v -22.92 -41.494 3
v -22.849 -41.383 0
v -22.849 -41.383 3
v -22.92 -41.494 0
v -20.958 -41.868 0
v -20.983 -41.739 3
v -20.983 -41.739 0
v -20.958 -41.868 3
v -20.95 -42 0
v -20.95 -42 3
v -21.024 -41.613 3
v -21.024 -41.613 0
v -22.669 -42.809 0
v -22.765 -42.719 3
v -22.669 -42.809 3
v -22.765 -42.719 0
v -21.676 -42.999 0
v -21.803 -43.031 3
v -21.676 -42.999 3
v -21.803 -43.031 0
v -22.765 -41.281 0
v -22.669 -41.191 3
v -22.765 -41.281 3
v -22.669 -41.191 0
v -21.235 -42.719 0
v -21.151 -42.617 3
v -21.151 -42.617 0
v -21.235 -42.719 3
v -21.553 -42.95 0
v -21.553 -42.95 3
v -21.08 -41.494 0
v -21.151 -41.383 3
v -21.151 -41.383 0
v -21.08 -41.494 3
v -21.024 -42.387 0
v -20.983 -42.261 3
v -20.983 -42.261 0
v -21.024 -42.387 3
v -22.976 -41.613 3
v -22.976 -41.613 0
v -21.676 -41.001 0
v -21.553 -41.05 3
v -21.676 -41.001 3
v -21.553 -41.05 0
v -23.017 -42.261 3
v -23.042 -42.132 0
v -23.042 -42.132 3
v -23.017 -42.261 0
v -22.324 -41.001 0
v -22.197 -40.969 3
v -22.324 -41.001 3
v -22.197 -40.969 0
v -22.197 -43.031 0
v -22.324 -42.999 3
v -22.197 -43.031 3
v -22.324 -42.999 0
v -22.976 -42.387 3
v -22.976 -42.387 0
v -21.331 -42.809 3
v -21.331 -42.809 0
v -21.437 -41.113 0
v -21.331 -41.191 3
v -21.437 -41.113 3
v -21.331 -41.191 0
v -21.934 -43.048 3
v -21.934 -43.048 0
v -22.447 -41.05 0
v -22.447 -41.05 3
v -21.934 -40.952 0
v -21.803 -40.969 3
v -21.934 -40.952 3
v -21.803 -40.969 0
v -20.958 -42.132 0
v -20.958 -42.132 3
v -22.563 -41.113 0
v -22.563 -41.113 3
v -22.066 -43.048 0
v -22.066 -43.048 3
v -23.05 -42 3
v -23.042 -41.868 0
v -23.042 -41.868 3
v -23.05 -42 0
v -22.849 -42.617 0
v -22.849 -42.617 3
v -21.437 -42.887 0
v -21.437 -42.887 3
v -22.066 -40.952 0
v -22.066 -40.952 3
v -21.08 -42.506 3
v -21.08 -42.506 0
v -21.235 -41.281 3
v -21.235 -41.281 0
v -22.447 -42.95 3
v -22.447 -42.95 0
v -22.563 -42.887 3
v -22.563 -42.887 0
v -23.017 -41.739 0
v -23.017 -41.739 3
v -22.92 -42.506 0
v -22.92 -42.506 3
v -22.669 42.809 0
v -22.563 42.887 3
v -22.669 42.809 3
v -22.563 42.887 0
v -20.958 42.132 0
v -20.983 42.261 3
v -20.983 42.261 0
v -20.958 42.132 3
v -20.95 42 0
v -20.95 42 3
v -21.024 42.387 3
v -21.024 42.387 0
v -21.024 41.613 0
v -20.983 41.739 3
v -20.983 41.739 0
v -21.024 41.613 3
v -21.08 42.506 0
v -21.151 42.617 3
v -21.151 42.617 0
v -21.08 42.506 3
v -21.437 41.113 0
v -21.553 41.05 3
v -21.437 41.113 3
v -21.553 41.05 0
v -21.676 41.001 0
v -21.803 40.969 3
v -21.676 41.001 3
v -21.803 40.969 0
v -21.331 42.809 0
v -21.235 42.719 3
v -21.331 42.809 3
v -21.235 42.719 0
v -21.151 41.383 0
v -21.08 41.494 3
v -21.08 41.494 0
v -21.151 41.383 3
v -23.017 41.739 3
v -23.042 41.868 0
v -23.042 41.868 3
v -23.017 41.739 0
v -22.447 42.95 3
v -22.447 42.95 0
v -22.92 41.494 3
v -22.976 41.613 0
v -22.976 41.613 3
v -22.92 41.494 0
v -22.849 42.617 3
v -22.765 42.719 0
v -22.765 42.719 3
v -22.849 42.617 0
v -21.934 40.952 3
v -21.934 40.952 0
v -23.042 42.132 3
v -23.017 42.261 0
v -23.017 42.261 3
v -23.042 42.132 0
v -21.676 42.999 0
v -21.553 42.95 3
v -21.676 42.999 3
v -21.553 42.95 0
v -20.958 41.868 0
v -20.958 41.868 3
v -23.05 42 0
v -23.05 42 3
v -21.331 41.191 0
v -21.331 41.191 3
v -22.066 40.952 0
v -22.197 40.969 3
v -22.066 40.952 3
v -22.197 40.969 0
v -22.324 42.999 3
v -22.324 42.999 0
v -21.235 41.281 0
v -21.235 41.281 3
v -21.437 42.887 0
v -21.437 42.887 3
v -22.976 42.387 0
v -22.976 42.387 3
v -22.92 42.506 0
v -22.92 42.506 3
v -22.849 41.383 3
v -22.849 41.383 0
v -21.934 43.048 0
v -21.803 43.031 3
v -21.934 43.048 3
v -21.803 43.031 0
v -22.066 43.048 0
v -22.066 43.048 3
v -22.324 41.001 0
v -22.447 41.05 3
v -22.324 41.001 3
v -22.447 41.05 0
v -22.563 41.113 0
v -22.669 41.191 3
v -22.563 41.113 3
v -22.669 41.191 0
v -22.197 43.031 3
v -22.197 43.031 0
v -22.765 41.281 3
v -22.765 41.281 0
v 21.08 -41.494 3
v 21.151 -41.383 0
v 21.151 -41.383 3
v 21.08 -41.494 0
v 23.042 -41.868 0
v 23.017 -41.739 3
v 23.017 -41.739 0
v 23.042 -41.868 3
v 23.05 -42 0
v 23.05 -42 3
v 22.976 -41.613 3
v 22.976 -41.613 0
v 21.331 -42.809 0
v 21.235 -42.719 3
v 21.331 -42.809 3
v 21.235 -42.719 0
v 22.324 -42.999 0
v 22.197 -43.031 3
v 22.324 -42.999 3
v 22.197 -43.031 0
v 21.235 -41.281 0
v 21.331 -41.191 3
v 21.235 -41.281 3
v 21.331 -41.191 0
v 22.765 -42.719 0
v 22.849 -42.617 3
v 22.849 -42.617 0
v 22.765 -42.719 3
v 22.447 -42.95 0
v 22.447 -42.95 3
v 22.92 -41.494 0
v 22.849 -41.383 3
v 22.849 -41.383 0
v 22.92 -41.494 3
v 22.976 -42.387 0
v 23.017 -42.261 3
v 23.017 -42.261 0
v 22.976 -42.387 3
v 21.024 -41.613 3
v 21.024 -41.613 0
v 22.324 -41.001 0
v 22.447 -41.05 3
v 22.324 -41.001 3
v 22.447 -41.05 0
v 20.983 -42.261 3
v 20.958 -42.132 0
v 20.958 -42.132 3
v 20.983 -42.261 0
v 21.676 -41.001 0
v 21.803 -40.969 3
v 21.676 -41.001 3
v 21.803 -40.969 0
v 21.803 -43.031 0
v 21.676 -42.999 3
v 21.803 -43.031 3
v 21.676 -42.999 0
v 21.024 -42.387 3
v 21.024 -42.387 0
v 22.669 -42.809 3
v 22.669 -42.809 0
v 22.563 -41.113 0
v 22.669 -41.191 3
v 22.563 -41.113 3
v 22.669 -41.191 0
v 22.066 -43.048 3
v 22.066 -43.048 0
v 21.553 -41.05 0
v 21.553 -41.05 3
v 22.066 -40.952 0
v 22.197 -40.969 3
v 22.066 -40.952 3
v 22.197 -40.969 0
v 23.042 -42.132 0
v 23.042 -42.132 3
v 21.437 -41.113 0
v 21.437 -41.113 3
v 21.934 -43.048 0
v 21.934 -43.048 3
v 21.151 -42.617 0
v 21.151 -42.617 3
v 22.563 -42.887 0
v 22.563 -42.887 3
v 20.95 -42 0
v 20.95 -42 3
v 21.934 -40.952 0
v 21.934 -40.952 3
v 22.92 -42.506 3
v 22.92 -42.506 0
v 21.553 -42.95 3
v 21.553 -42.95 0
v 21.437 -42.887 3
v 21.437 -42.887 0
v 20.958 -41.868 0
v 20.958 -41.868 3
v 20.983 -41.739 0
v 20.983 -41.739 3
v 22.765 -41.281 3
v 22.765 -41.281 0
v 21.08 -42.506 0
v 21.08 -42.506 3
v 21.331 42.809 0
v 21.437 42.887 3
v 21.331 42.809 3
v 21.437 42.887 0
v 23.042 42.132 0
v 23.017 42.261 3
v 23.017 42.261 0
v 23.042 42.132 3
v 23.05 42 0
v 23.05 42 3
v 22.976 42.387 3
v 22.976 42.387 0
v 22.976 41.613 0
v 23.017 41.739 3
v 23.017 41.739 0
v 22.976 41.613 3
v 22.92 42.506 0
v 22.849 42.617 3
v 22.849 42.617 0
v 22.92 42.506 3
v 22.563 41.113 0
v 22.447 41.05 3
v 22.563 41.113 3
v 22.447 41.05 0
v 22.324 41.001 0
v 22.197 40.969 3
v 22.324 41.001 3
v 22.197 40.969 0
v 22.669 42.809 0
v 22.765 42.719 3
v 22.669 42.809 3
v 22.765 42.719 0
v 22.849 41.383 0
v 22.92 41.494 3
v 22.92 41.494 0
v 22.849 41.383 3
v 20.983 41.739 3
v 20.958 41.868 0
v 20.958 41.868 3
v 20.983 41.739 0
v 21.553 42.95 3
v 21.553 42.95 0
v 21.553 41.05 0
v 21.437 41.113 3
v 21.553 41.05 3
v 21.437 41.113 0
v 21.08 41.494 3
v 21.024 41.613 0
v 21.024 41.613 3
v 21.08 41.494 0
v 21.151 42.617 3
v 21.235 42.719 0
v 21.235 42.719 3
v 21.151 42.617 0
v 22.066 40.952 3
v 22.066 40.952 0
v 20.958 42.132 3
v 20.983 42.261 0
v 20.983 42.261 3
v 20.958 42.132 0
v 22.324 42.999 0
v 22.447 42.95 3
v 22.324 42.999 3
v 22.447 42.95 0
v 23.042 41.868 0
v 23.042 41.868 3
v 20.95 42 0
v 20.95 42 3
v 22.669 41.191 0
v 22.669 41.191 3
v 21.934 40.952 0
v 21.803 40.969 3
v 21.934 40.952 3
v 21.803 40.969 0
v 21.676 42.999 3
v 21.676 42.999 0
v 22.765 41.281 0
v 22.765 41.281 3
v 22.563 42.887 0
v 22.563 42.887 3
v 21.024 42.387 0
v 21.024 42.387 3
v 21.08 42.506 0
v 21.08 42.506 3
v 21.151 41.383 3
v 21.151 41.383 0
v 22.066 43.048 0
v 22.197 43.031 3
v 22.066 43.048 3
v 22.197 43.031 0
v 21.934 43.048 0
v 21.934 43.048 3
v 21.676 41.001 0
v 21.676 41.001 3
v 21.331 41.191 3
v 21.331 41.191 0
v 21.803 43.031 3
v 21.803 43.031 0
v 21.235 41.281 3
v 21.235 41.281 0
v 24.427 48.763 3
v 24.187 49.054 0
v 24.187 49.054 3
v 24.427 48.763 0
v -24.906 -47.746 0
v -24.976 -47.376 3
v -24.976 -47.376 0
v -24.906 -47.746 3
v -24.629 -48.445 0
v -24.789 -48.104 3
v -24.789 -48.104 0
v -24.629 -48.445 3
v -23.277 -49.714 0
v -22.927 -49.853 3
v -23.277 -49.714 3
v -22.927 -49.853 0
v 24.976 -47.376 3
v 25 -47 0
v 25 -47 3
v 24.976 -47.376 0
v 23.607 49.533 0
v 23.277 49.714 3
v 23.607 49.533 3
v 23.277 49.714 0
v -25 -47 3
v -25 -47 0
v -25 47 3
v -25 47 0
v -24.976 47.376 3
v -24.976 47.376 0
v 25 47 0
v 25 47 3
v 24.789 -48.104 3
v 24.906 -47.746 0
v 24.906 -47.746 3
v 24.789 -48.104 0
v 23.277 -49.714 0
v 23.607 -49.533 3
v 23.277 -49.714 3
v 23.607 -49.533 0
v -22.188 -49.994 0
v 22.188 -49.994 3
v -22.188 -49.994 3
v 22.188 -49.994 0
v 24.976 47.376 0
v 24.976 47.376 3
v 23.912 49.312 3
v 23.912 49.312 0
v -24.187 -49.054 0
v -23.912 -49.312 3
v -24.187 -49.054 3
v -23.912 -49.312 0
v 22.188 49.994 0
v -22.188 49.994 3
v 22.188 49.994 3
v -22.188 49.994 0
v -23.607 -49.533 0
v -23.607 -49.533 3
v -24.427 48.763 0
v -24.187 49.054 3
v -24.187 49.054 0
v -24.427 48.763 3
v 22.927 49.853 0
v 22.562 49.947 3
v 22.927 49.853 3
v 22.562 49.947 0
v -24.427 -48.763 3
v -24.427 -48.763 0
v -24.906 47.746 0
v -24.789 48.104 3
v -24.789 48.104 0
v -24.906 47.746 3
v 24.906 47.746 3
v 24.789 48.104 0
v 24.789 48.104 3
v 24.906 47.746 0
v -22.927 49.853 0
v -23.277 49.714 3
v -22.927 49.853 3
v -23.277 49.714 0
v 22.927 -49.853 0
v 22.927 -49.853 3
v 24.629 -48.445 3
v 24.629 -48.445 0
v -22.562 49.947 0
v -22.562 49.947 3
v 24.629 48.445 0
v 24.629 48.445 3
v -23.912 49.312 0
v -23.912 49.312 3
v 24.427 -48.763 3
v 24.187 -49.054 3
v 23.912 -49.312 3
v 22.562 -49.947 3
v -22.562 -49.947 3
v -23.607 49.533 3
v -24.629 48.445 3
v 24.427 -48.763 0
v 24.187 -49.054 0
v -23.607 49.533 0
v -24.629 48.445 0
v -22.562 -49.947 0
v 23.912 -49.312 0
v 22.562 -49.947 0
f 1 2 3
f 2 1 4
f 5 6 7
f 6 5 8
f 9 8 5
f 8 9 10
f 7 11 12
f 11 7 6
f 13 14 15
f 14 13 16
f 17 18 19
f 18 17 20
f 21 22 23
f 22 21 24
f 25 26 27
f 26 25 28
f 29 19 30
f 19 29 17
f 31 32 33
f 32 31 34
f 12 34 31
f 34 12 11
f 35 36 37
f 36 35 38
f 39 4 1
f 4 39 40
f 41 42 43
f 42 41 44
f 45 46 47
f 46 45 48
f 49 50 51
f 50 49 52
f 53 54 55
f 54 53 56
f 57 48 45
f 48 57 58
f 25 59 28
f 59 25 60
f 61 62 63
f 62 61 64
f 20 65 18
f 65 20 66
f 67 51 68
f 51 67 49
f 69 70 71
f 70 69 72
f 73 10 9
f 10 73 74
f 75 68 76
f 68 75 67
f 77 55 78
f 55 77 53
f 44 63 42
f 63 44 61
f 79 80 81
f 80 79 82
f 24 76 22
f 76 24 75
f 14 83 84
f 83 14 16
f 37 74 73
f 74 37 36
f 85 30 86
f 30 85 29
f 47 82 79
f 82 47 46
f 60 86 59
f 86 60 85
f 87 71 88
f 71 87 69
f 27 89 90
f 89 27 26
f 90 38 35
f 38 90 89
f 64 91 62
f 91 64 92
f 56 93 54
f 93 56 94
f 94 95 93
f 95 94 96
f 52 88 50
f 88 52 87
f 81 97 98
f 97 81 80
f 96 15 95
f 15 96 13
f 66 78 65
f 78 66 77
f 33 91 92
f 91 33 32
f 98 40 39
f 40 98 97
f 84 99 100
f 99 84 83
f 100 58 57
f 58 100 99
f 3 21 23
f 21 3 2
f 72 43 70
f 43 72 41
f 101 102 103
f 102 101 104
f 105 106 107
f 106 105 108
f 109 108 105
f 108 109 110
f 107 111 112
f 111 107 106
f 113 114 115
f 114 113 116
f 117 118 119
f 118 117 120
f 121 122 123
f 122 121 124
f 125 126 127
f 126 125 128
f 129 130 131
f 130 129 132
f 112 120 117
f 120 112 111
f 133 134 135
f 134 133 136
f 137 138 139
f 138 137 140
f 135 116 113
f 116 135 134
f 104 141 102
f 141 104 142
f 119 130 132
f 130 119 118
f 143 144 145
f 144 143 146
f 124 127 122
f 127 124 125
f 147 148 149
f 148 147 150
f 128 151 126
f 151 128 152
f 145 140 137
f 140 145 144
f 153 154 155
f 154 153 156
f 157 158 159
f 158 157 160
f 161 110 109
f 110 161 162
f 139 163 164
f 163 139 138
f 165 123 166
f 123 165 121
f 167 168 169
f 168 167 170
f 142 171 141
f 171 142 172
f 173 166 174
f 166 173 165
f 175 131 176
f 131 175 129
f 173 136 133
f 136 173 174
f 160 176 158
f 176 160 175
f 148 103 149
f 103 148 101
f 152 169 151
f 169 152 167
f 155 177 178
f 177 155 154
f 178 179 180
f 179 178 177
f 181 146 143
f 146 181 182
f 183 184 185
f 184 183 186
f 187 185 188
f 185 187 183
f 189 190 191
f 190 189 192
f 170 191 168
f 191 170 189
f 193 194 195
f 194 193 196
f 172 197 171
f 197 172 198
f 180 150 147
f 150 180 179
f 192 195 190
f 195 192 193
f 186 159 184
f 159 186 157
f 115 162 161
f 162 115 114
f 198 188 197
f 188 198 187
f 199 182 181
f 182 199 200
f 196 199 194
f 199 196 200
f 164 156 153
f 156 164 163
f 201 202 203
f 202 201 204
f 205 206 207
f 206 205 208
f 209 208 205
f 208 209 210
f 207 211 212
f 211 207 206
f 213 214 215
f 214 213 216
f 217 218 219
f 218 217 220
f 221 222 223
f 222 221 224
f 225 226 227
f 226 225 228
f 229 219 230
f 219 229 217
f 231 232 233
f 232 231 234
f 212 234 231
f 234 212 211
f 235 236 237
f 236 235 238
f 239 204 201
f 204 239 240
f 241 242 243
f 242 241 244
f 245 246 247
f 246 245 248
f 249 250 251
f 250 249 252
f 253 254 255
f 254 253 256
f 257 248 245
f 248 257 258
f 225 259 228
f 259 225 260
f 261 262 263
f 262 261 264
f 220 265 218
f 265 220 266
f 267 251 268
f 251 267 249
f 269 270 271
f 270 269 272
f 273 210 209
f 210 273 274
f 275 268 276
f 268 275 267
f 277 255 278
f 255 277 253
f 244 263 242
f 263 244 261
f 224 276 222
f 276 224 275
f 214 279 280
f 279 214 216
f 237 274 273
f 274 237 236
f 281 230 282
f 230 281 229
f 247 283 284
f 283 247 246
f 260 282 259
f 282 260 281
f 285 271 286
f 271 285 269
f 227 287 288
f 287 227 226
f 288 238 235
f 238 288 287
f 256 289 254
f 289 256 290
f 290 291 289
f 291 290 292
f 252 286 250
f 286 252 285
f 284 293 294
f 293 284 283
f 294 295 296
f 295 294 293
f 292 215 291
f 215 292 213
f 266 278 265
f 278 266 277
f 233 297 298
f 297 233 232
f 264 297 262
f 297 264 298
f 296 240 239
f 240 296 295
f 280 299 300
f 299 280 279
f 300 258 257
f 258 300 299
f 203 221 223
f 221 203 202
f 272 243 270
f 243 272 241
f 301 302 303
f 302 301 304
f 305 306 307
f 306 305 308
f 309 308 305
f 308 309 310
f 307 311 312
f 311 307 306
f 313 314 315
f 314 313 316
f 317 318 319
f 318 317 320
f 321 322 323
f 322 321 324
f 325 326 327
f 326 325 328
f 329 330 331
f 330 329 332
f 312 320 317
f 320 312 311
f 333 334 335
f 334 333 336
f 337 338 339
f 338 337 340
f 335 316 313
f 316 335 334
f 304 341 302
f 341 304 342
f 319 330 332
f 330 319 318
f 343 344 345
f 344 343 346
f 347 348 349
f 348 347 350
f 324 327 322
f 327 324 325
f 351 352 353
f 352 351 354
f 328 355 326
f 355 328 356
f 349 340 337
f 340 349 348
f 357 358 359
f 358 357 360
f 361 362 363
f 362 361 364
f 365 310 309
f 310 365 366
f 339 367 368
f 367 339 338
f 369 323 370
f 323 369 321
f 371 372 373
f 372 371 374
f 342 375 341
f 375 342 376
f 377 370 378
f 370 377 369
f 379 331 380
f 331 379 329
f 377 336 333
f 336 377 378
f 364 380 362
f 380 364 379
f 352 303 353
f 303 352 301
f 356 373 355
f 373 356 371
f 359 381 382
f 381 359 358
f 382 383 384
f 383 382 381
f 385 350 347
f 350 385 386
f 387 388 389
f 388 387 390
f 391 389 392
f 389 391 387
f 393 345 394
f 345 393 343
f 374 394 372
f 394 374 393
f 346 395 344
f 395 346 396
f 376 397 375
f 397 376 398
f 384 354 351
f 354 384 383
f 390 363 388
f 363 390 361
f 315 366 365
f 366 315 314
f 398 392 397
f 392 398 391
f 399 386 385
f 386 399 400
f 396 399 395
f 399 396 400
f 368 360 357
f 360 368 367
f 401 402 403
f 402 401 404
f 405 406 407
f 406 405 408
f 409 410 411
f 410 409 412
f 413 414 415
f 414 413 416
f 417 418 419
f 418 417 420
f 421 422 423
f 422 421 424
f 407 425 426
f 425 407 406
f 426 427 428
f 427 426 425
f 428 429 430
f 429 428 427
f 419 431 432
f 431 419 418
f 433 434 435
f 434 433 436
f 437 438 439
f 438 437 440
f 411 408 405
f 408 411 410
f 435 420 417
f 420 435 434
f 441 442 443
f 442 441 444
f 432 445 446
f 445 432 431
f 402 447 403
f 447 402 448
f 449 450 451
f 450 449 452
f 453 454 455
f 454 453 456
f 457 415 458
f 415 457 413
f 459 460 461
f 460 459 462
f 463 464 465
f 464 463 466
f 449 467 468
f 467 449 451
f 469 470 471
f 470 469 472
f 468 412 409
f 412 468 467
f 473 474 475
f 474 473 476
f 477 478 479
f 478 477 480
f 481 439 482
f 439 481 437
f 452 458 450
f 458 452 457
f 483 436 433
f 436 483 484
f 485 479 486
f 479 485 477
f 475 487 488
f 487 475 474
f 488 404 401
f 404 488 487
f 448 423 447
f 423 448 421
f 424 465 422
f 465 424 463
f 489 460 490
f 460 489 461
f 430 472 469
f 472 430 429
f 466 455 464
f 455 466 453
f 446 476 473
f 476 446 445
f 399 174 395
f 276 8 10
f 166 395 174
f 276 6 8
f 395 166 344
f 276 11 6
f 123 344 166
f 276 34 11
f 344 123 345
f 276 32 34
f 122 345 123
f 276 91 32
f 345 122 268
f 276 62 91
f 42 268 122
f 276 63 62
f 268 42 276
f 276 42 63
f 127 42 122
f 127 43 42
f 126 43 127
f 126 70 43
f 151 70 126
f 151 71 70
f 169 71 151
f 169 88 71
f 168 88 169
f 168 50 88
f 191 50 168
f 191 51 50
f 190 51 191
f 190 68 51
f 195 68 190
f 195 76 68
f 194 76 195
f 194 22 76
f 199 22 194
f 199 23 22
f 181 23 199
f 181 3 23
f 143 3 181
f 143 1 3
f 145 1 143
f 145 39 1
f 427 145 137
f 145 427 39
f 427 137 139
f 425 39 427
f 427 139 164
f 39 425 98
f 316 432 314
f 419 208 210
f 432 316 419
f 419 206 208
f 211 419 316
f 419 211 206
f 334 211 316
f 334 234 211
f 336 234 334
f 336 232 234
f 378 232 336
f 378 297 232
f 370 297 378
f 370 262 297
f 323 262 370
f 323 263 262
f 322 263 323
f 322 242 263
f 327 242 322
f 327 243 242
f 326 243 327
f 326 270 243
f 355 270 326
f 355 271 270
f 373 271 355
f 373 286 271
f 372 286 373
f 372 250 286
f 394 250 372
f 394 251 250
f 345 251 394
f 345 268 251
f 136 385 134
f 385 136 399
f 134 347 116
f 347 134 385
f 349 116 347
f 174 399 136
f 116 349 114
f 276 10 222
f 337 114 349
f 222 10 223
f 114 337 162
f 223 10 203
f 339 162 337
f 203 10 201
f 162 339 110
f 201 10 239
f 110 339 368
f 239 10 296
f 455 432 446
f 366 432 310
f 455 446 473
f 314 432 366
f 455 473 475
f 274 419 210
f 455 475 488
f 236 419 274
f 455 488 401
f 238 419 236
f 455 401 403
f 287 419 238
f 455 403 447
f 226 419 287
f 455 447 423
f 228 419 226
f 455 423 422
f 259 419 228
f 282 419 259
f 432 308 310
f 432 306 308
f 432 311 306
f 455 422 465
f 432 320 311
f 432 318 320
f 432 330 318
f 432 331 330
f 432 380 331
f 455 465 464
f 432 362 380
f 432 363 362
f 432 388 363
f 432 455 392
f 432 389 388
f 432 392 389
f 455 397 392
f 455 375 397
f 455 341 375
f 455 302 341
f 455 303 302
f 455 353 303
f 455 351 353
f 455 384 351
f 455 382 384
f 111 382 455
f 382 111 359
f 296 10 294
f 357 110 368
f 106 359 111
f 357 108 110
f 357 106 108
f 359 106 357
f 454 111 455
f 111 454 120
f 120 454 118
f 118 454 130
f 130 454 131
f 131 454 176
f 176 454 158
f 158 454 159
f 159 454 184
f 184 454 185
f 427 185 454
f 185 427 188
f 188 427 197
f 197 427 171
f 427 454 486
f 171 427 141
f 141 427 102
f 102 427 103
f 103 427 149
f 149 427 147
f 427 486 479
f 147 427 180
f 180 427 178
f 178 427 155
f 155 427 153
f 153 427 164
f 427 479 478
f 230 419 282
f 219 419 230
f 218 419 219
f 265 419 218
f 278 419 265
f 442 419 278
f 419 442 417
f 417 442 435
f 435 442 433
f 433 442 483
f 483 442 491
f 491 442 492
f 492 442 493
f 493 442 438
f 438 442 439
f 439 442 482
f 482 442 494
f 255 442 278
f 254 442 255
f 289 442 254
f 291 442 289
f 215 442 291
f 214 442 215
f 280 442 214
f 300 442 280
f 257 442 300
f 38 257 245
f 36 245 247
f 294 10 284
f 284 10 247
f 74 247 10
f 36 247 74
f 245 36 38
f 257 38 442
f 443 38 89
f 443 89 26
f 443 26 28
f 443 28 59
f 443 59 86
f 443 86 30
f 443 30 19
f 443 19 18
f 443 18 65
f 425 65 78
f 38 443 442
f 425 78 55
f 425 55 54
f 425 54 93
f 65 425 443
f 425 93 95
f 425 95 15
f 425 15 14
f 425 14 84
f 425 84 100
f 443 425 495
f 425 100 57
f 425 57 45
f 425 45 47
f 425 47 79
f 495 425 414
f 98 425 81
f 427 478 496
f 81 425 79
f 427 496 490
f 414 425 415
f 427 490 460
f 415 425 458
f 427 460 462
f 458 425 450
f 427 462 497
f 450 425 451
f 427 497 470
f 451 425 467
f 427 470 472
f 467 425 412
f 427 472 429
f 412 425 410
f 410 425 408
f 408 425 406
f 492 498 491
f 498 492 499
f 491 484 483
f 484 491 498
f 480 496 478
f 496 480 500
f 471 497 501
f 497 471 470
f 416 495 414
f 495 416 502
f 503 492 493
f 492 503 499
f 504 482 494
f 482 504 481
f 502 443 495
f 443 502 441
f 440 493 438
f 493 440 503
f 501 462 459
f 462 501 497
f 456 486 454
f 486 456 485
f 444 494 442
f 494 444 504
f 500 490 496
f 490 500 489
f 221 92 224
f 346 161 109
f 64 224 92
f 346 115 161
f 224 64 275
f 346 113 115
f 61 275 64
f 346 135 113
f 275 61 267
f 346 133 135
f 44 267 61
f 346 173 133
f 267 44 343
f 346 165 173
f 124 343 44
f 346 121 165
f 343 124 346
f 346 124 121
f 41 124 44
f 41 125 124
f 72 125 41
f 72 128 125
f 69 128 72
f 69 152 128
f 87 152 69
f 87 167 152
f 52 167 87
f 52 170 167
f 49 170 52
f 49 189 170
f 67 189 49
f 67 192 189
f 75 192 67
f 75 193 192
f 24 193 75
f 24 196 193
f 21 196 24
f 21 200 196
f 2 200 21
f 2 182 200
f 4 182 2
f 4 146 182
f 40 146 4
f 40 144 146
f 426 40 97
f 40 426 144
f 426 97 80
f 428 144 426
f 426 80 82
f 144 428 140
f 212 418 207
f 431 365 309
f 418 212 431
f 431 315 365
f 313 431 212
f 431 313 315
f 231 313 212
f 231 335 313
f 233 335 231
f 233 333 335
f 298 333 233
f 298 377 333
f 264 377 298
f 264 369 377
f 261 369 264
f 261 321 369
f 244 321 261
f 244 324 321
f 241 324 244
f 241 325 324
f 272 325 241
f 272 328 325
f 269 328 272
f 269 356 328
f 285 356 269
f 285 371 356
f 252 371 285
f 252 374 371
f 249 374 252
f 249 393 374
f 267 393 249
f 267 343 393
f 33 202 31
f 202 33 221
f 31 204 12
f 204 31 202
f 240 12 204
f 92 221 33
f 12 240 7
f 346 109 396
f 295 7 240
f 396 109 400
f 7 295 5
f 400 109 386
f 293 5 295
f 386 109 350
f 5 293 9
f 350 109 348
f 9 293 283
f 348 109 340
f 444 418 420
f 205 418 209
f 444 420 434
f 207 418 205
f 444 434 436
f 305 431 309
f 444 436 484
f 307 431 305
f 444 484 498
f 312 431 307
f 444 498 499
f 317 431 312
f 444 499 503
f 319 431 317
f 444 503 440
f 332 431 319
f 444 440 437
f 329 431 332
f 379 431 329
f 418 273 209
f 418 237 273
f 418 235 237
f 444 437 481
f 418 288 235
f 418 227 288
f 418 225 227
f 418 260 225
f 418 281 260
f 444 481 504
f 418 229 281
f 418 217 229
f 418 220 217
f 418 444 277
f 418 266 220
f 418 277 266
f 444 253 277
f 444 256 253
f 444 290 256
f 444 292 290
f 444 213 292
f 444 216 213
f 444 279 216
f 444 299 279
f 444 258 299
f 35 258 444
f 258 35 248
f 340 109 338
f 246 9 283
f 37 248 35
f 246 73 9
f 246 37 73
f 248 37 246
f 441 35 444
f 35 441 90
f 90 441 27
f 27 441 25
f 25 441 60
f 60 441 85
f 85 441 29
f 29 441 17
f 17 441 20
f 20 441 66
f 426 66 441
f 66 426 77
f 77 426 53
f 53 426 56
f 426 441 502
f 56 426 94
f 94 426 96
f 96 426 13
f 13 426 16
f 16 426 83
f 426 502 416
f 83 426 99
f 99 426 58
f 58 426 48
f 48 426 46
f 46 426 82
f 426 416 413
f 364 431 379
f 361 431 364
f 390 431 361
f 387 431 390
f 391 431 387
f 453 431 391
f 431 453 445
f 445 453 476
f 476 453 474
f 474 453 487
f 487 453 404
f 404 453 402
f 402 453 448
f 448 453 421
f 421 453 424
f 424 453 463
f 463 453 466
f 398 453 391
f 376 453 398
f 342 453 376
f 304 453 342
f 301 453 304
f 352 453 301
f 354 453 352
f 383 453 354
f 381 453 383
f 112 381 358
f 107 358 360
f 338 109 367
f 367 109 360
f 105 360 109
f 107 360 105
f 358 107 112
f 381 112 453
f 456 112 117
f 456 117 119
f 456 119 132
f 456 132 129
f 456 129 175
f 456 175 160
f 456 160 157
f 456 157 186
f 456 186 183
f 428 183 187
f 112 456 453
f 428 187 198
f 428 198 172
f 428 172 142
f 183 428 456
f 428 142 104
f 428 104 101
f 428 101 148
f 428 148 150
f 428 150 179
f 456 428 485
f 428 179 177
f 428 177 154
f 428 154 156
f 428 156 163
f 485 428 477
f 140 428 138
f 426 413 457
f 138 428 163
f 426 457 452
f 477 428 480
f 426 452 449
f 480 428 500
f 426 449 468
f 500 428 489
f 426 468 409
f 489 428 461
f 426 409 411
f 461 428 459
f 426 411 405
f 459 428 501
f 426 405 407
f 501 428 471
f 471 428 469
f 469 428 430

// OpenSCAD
/* Rounded Rectangle with drill holes
  This is mainly intended for "Pimoroni-Style" electronics housings.
  These are stagged layers of acrylic sheets with cutouts for PCBs, connecctors, displays etc.
  in each Layer. 
*/
$fn=50;
rndRect(50,100,3,3,2.1,true,"none","layer1",[0,5]);

module rndRect(wdth, hght, thick, radius, drill,cntr=true,diff="none",label="none",drillOffset=[0,0]) {
  fudge=0.1;
  //set radius to minimum if less then wdth or high
  comp = (wdth>hght) ? hght : wdth; //which value to compare to
  radius = (radius>(comp/2)) ?  comp/2 : radius; //set radius
  cntrOffset = cntr ? [0,0,0] :[wdth/2,hght/2,0];
  
  translate(cntrOffset){
    if (diff=="screws"){ //drill holes
      for (i=[-1,1]){ 
        for (j=[-1,1]){
          translate([i*(wdth/2-radius+drillOffset.x),j*(hght/2-radius+drillOffset.y),-fudge/2]) 
            cylinder(h=thick+fudge, d=drill);
        }
      }
    }//if screwheads
    
    else if (drill>=radius*2){//if drill bigger than radius make screw Head cover
      difference(){
        translate([0,0,thick/2]) cube([wdth,hght,thick],true); //base is cube
          for (i=[-1:2:1]){
            for (j=[-1:2:1]){
              translate([i*(wdth/2),j*(hght/2),-fudge/2])
                rndRect(drill*2,drill*2,thick+fudge,drill/2,0,"none");
                //cylinder(h=thick+fudge, d=drill);
              
              translate([i*((wdth/2)-drill*1.25+fudge/2),j*((hght/2)-drill/4+fudge/2),thick/2]) 
                difference(){
                  cube([drill/2+fudge,drill/2+fudge,thick+fudge],true);
                  translate([i*(-drill/4-fudge/2),j*(-drill/4-fudge/2),-thick/2-fudge/2]) cylinder(h=thick+fudge,d=drill);
                }
              translate([i*((wdth/2)-drill/4+fudge/2),j*((hght/2)-drill*1.25+fudge/2),thick/2]) 
              difference(){
                cube([drill/2+fudge,drill/2+fudge,thick+fudge],true);
                translate([i*(-drill/4-fudge/2),j*(-drill/4-fudge/2),-thick/2-fudge/2]) cylinder(h=thick+fudge,d=drill);
              }
            }
          }
        }//diff
    }//else
    
    else { //make rounded plate with screw holes
      difference(){
        hull(){
          for (i=[-1,1]){
            for (j=[-1,1]){
              translate([i*(wdth/2-radius),j*(hght/2-radius),0])
                cylinder(h=thick, r=radius);//cube
            }
          }
        }
        for (i=[-1,1]){ //drill holes
          for (j=[-1,1]){
            translate([i*(wdth/2-radius-drillOffset.x),j*(hght/2-radius-drillOffset.y),-fudge/2]) cylinder(h=thick+fudge, d=drill);
          }
        }
        //label                    rght, lft, btm, top
        /*if (label!="none") // i,j: -1,0 1,0 0,-1 0,1
          for (i=[ [[1, 0],[90,0, 90]],    //right
                   [[-1, 0],[90,0,-90]],    //left
                   [[ 0,-1],[90,0,  0]],    //front
                   [[ 0,1 ],[90,0,180]] ]){  //back
            
            translate([i[0][0]*(wdth/2-fudge),i[0][1]*(hght/2-fudge),thick/2]) // 
              rotate(i[1]) //90,0,90 90,0,-90 90,0,0 90,0,180
                linear_extrude(fudge*2,convexity=10)
                  text(label,halign="center",valign="center",size=0.6*thick);
            
          }//if .. for i
          */
      }//difference
    }//else
    //label                    rght, lft, btm, top
        if (label!="none") // i,j: -1,0 1,0 0,-1 0,1
          for (i=[ [[1, 0],[90,0, 90]],    //right
                   [[-1, 0],[90,0,-90]],    //left
                   [[ 0,-1],[90,0,  0]],    //front
                   [[ 0,1 ],[90,0,180]] ]){  //back
            color("white")
            translate([i[0][0]*(wdth/2),i[0][1]*(hght/2),thick/2]) // 
              rotate(i[1]) //90,0,90 90,0,-90 90,0,0 90,0,180
                  text(label,halign="center",valign="center",size=0.6*thick);
            
          }//if .. for i
         
    
  }//cntrOffset
  
}
